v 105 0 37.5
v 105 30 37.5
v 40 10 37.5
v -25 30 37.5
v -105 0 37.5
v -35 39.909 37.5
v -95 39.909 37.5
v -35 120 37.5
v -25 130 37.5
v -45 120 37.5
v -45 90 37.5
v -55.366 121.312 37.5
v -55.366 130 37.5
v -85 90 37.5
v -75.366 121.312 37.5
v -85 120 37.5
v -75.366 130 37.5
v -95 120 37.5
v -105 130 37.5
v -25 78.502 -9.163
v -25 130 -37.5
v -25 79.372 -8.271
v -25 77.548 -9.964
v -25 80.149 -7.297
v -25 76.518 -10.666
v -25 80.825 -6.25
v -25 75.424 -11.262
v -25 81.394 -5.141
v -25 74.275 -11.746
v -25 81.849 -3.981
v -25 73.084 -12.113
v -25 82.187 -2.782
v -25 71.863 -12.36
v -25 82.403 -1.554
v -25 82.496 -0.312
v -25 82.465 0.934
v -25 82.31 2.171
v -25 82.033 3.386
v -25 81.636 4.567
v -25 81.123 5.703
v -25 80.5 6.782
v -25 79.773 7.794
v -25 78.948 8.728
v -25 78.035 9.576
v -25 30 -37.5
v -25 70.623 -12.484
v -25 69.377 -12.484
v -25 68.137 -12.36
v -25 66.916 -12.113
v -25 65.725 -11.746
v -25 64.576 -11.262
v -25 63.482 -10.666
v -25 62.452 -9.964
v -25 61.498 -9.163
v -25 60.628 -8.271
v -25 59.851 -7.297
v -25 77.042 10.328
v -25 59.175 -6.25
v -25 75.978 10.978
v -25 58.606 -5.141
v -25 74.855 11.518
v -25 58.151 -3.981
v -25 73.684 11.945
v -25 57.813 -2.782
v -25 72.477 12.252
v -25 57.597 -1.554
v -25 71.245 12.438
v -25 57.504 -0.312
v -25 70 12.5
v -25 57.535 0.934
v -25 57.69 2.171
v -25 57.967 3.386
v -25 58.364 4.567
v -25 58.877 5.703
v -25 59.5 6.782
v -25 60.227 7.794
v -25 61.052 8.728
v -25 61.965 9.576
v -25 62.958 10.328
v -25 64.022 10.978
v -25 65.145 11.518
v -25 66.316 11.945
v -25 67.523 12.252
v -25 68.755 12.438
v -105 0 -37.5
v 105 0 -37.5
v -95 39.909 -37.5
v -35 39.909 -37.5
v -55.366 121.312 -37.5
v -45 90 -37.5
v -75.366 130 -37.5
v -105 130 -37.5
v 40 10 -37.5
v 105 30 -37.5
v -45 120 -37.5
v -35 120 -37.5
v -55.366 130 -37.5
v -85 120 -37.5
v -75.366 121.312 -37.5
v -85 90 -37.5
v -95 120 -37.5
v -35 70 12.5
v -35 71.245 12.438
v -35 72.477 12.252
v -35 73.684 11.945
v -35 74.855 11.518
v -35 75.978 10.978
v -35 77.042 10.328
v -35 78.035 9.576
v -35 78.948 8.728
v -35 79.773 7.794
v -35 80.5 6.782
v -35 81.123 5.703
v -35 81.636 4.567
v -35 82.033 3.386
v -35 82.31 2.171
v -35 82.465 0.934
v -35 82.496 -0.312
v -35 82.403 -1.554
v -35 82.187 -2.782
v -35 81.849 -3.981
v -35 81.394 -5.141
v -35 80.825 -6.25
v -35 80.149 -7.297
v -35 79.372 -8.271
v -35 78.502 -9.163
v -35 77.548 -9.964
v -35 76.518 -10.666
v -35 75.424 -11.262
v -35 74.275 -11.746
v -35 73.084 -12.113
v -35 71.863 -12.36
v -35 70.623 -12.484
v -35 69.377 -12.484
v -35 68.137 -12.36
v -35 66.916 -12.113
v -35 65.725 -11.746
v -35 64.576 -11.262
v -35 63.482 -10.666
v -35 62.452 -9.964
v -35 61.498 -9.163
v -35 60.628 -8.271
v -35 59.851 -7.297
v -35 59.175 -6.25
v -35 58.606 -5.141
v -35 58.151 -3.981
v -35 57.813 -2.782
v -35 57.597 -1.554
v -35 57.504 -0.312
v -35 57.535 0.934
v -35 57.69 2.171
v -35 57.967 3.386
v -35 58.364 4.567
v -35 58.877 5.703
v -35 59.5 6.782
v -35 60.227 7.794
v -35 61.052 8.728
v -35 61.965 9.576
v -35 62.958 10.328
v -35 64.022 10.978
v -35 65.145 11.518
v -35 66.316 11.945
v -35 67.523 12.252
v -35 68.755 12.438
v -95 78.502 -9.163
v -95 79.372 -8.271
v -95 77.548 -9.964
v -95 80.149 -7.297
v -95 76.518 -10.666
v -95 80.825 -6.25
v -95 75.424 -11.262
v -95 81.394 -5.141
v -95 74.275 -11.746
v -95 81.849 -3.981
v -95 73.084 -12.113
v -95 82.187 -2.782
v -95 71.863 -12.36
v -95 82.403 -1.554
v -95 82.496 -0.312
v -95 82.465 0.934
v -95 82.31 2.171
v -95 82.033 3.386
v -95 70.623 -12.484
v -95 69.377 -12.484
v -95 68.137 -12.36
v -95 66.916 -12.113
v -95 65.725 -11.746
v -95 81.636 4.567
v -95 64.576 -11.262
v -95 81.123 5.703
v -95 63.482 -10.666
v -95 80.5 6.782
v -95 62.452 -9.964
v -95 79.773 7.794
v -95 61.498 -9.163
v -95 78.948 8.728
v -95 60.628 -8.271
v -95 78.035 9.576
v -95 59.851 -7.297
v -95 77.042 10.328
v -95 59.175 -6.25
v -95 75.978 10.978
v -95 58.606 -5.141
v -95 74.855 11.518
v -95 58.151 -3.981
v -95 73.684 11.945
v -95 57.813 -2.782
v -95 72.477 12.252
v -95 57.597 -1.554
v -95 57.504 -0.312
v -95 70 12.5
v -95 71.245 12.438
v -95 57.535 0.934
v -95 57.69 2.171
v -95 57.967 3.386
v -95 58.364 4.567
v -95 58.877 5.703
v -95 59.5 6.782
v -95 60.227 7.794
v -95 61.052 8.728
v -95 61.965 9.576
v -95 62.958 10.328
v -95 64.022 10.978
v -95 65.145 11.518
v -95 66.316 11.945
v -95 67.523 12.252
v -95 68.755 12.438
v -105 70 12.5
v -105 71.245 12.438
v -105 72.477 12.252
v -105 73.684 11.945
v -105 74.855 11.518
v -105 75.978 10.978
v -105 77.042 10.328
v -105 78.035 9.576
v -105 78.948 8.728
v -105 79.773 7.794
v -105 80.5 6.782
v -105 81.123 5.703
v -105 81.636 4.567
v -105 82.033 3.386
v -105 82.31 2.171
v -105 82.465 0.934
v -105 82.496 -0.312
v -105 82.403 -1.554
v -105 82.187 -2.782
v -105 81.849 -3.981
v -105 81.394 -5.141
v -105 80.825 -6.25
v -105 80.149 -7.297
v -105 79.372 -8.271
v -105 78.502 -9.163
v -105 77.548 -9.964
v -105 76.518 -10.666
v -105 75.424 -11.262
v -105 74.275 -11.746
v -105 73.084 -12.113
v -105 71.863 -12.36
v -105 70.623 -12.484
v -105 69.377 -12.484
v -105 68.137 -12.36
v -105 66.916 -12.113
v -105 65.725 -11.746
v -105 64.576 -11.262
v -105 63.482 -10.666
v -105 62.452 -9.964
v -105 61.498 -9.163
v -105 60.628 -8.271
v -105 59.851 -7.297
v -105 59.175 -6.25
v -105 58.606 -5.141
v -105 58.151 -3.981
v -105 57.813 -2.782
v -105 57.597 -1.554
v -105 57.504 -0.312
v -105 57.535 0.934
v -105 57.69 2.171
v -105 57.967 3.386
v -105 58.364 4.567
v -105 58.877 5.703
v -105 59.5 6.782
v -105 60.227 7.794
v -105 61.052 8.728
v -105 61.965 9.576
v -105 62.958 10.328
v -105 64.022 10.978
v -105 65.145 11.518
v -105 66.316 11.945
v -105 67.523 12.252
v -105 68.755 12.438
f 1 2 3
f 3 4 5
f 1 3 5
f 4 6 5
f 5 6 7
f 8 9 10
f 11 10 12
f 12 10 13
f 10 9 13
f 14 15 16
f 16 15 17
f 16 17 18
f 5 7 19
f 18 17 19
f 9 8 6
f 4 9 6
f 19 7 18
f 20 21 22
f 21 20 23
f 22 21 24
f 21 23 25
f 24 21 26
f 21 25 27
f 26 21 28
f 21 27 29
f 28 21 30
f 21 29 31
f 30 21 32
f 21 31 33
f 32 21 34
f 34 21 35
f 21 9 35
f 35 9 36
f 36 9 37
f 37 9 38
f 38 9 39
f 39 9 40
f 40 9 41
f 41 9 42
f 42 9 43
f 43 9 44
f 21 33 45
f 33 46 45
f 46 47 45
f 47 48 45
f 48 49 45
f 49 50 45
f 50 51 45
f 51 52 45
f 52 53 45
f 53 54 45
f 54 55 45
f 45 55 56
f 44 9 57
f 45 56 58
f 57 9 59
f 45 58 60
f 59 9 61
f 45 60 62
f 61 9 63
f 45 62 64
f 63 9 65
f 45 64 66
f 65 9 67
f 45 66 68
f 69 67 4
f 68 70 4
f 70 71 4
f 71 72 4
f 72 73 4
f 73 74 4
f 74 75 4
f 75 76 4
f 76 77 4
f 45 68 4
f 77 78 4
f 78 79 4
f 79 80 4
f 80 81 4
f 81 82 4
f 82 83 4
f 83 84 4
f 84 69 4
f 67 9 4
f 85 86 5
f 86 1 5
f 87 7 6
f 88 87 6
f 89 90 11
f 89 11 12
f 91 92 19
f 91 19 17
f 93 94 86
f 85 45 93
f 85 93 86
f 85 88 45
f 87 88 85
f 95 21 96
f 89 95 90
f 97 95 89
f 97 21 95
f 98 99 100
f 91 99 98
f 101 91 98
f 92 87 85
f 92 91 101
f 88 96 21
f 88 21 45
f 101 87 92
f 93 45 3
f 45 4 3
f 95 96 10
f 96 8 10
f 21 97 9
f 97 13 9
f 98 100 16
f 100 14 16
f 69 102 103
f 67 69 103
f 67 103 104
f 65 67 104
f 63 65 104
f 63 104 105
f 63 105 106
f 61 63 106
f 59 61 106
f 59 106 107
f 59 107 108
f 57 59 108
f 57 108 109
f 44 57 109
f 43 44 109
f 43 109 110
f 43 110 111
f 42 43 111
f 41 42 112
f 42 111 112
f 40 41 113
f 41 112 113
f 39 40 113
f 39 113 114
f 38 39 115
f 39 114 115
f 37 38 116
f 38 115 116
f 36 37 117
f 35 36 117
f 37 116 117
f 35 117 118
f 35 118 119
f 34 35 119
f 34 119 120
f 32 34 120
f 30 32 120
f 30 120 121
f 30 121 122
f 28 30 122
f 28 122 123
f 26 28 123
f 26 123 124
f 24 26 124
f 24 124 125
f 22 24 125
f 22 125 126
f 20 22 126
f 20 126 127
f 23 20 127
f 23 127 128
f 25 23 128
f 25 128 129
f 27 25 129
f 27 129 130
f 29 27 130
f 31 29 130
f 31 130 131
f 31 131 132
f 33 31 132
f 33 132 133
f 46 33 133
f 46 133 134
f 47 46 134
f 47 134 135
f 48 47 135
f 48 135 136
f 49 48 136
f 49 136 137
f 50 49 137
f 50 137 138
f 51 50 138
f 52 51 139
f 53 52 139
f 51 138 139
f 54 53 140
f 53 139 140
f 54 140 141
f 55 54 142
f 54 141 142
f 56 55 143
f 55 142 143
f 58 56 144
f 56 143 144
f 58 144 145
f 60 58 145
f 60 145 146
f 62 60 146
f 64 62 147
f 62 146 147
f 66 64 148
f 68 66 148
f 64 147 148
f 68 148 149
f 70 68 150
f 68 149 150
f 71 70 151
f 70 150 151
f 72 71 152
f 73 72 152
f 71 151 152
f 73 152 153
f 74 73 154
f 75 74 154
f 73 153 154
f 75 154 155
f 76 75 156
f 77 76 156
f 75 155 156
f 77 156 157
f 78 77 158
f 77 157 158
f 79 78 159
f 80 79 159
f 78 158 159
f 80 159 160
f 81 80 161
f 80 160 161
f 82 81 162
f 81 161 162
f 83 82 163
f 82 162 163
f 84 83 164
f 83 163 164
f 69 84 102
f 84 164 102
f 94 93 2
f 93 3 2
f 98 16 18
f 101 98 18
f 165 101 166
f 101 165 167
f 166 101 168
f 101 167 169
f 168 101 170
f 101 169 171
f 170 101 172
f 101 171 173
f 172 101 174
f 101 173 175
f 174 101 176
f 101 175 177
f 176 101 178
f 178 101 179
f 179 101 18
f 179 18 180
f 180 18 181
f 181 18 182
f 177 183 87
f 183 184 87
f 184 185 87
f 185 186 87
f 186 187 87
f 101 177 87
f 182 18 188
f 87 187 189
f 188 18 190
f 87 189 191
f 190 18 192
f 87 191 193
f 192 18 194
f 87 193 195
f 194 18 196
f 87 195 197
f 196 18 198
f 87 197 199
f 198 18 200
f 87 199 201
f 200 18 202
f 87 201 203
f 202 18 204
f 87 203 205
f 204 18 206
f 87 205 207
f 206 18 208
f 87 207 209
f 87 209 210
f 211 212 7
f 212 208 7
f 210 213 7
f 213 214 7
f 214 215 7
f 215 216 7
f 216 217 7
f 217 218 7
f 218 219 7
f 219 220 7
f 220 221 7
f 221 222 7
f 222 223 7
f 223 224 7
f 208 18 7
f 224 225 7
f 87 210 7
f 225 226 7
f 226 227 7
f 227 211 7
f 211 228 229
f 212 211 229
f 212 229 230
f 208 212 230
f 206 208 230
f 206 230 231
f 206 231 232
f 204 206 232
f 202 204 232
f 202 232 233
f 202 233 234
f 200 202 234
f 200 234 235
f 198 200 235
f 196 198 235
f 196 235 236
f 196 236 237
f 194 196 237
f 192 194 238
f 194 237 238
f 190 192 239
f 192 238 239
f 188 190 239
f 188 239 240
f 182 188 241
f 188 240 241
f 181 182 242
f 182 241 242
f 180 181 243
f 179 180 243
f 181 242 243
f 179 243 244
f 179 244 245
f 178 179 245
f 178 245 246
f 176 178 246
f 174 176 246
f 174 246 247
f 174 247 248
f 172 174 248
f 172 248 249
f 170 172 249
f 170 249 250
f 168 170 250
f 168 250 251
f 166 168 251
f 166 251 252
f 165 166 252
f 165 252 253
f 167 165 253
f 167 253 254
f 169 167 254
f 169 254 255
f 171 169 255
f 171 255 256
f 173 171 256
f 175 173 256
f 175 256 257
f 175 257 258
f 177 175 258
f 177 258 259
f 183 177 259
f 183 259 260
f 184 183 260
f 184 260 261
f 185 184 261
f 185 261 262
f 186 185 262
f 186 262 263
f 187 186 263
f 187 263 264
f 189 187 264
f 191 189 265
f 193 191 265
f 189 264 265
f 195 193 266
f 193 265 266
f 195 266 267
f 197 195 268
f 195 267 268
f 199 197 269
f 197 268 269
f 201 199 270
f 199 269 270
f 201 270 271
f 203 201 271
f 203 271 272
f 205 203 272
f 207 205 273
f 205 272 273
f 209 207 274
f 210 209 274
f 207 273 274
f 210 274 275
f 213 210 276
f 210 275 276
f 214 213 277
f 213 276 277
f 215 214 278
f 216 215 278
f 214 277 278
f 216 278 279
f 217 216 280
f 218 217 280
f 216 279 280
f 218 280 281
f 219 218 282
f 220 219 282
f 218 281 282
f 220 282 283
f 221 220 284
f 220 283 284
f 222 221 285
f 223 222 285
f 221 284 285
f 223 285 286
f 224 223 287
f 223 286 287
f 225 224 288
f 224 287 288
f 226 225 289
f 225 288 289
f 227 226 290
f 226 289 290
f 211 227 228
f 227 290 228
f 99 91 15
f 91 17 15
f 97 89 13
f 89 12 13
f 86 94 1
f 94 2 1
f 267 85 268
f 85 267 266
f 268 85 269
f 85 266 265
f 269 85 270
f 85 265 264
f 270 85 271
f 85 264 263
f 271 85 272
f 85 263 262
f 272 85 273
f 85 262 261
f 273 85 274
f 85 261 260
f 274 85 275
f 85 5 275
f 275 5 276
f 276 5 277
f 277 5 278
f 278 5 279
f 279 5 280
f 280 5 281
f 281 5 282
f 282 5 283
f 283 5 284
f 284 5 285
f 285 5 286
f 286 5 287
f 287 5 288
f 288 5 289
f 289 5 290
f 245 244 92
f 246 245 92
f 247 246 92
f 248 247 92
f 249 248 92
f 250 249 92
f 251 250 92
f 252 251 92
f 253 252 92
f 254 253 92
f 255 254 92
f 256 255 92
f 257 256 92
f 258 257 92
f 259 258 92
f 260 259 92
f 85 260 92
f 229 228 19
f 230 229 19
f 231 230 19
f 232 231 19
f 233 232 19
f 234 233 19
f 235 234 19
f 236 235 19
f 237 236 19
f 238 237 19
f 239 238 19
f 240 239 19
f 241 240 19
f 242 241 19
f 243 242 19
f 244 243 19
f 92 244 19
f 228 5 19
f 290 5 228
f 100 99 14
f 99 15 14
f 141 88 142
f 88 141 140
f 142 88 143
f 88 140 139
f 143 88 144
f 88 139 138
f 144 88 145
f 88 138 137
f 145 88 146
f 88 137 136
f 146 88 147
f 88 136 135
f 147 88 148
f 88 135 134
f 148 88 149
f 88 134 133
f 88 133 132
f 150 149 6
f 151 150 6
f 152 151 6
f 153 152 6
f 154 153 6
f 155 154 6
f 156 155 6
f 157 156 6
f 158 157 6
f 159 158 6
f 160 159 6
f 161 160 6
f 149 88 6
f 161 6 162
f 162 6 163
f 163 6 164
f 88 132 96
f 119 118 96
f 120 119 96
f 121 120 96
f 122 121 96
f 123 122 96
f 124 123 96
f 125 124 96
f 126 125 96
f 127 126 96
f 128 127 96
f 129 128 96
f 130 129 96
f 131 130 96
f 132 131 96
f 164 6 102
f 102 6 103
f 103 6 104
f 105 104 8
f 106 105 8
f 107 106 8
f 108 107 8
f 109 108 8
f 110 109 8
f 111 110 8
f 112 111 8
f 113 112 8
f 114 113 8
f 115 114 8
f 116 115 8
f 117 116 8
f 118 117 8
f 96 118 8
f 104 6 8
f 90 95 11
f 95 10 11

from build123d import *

# Parameters (mm, degrees)
BOSS_EXTRUDE1_DEPTH = 37.5
SKETCH2_R           = 12.5
CUT_EXTRUDE1_DEPTH  = 100


with BuildPart() as part:
    # Sketch1 → Boss-Extrude1 (new body, symmetric)
    with BuildSketch(Plane.XY):
        Polygon((-95, 39.909181495), (-35, 39.909181495), (-35, 120), (-45, 120), (-45, 90), (-55.365508708, 121.312096701), (-55.365508708, 130), (-25, 130), (-25, 30), (40, 10), (105, 30), (105, 0), (-105, 0), (-105, 130), (-75.365508708, 130), (-75.365508708, 121.312096701), (-85, 90), (-85, 120), (-95, 120), align=None)
    extrude(amount=BOSS_EXTRUDE1_DEPTH, both=True)

    # Sketch2 → Cut-Extrude1 (cut)
    with BuildSketch(Plane.ZY.offset(105)):
        with Locations((0, 70)):
            Circle(SKETCH2_R)
    extrude(amount=-CUT_EXTRUDE1_DEPTH, mode=Mode.SUBTRACT)


solid = part.part
